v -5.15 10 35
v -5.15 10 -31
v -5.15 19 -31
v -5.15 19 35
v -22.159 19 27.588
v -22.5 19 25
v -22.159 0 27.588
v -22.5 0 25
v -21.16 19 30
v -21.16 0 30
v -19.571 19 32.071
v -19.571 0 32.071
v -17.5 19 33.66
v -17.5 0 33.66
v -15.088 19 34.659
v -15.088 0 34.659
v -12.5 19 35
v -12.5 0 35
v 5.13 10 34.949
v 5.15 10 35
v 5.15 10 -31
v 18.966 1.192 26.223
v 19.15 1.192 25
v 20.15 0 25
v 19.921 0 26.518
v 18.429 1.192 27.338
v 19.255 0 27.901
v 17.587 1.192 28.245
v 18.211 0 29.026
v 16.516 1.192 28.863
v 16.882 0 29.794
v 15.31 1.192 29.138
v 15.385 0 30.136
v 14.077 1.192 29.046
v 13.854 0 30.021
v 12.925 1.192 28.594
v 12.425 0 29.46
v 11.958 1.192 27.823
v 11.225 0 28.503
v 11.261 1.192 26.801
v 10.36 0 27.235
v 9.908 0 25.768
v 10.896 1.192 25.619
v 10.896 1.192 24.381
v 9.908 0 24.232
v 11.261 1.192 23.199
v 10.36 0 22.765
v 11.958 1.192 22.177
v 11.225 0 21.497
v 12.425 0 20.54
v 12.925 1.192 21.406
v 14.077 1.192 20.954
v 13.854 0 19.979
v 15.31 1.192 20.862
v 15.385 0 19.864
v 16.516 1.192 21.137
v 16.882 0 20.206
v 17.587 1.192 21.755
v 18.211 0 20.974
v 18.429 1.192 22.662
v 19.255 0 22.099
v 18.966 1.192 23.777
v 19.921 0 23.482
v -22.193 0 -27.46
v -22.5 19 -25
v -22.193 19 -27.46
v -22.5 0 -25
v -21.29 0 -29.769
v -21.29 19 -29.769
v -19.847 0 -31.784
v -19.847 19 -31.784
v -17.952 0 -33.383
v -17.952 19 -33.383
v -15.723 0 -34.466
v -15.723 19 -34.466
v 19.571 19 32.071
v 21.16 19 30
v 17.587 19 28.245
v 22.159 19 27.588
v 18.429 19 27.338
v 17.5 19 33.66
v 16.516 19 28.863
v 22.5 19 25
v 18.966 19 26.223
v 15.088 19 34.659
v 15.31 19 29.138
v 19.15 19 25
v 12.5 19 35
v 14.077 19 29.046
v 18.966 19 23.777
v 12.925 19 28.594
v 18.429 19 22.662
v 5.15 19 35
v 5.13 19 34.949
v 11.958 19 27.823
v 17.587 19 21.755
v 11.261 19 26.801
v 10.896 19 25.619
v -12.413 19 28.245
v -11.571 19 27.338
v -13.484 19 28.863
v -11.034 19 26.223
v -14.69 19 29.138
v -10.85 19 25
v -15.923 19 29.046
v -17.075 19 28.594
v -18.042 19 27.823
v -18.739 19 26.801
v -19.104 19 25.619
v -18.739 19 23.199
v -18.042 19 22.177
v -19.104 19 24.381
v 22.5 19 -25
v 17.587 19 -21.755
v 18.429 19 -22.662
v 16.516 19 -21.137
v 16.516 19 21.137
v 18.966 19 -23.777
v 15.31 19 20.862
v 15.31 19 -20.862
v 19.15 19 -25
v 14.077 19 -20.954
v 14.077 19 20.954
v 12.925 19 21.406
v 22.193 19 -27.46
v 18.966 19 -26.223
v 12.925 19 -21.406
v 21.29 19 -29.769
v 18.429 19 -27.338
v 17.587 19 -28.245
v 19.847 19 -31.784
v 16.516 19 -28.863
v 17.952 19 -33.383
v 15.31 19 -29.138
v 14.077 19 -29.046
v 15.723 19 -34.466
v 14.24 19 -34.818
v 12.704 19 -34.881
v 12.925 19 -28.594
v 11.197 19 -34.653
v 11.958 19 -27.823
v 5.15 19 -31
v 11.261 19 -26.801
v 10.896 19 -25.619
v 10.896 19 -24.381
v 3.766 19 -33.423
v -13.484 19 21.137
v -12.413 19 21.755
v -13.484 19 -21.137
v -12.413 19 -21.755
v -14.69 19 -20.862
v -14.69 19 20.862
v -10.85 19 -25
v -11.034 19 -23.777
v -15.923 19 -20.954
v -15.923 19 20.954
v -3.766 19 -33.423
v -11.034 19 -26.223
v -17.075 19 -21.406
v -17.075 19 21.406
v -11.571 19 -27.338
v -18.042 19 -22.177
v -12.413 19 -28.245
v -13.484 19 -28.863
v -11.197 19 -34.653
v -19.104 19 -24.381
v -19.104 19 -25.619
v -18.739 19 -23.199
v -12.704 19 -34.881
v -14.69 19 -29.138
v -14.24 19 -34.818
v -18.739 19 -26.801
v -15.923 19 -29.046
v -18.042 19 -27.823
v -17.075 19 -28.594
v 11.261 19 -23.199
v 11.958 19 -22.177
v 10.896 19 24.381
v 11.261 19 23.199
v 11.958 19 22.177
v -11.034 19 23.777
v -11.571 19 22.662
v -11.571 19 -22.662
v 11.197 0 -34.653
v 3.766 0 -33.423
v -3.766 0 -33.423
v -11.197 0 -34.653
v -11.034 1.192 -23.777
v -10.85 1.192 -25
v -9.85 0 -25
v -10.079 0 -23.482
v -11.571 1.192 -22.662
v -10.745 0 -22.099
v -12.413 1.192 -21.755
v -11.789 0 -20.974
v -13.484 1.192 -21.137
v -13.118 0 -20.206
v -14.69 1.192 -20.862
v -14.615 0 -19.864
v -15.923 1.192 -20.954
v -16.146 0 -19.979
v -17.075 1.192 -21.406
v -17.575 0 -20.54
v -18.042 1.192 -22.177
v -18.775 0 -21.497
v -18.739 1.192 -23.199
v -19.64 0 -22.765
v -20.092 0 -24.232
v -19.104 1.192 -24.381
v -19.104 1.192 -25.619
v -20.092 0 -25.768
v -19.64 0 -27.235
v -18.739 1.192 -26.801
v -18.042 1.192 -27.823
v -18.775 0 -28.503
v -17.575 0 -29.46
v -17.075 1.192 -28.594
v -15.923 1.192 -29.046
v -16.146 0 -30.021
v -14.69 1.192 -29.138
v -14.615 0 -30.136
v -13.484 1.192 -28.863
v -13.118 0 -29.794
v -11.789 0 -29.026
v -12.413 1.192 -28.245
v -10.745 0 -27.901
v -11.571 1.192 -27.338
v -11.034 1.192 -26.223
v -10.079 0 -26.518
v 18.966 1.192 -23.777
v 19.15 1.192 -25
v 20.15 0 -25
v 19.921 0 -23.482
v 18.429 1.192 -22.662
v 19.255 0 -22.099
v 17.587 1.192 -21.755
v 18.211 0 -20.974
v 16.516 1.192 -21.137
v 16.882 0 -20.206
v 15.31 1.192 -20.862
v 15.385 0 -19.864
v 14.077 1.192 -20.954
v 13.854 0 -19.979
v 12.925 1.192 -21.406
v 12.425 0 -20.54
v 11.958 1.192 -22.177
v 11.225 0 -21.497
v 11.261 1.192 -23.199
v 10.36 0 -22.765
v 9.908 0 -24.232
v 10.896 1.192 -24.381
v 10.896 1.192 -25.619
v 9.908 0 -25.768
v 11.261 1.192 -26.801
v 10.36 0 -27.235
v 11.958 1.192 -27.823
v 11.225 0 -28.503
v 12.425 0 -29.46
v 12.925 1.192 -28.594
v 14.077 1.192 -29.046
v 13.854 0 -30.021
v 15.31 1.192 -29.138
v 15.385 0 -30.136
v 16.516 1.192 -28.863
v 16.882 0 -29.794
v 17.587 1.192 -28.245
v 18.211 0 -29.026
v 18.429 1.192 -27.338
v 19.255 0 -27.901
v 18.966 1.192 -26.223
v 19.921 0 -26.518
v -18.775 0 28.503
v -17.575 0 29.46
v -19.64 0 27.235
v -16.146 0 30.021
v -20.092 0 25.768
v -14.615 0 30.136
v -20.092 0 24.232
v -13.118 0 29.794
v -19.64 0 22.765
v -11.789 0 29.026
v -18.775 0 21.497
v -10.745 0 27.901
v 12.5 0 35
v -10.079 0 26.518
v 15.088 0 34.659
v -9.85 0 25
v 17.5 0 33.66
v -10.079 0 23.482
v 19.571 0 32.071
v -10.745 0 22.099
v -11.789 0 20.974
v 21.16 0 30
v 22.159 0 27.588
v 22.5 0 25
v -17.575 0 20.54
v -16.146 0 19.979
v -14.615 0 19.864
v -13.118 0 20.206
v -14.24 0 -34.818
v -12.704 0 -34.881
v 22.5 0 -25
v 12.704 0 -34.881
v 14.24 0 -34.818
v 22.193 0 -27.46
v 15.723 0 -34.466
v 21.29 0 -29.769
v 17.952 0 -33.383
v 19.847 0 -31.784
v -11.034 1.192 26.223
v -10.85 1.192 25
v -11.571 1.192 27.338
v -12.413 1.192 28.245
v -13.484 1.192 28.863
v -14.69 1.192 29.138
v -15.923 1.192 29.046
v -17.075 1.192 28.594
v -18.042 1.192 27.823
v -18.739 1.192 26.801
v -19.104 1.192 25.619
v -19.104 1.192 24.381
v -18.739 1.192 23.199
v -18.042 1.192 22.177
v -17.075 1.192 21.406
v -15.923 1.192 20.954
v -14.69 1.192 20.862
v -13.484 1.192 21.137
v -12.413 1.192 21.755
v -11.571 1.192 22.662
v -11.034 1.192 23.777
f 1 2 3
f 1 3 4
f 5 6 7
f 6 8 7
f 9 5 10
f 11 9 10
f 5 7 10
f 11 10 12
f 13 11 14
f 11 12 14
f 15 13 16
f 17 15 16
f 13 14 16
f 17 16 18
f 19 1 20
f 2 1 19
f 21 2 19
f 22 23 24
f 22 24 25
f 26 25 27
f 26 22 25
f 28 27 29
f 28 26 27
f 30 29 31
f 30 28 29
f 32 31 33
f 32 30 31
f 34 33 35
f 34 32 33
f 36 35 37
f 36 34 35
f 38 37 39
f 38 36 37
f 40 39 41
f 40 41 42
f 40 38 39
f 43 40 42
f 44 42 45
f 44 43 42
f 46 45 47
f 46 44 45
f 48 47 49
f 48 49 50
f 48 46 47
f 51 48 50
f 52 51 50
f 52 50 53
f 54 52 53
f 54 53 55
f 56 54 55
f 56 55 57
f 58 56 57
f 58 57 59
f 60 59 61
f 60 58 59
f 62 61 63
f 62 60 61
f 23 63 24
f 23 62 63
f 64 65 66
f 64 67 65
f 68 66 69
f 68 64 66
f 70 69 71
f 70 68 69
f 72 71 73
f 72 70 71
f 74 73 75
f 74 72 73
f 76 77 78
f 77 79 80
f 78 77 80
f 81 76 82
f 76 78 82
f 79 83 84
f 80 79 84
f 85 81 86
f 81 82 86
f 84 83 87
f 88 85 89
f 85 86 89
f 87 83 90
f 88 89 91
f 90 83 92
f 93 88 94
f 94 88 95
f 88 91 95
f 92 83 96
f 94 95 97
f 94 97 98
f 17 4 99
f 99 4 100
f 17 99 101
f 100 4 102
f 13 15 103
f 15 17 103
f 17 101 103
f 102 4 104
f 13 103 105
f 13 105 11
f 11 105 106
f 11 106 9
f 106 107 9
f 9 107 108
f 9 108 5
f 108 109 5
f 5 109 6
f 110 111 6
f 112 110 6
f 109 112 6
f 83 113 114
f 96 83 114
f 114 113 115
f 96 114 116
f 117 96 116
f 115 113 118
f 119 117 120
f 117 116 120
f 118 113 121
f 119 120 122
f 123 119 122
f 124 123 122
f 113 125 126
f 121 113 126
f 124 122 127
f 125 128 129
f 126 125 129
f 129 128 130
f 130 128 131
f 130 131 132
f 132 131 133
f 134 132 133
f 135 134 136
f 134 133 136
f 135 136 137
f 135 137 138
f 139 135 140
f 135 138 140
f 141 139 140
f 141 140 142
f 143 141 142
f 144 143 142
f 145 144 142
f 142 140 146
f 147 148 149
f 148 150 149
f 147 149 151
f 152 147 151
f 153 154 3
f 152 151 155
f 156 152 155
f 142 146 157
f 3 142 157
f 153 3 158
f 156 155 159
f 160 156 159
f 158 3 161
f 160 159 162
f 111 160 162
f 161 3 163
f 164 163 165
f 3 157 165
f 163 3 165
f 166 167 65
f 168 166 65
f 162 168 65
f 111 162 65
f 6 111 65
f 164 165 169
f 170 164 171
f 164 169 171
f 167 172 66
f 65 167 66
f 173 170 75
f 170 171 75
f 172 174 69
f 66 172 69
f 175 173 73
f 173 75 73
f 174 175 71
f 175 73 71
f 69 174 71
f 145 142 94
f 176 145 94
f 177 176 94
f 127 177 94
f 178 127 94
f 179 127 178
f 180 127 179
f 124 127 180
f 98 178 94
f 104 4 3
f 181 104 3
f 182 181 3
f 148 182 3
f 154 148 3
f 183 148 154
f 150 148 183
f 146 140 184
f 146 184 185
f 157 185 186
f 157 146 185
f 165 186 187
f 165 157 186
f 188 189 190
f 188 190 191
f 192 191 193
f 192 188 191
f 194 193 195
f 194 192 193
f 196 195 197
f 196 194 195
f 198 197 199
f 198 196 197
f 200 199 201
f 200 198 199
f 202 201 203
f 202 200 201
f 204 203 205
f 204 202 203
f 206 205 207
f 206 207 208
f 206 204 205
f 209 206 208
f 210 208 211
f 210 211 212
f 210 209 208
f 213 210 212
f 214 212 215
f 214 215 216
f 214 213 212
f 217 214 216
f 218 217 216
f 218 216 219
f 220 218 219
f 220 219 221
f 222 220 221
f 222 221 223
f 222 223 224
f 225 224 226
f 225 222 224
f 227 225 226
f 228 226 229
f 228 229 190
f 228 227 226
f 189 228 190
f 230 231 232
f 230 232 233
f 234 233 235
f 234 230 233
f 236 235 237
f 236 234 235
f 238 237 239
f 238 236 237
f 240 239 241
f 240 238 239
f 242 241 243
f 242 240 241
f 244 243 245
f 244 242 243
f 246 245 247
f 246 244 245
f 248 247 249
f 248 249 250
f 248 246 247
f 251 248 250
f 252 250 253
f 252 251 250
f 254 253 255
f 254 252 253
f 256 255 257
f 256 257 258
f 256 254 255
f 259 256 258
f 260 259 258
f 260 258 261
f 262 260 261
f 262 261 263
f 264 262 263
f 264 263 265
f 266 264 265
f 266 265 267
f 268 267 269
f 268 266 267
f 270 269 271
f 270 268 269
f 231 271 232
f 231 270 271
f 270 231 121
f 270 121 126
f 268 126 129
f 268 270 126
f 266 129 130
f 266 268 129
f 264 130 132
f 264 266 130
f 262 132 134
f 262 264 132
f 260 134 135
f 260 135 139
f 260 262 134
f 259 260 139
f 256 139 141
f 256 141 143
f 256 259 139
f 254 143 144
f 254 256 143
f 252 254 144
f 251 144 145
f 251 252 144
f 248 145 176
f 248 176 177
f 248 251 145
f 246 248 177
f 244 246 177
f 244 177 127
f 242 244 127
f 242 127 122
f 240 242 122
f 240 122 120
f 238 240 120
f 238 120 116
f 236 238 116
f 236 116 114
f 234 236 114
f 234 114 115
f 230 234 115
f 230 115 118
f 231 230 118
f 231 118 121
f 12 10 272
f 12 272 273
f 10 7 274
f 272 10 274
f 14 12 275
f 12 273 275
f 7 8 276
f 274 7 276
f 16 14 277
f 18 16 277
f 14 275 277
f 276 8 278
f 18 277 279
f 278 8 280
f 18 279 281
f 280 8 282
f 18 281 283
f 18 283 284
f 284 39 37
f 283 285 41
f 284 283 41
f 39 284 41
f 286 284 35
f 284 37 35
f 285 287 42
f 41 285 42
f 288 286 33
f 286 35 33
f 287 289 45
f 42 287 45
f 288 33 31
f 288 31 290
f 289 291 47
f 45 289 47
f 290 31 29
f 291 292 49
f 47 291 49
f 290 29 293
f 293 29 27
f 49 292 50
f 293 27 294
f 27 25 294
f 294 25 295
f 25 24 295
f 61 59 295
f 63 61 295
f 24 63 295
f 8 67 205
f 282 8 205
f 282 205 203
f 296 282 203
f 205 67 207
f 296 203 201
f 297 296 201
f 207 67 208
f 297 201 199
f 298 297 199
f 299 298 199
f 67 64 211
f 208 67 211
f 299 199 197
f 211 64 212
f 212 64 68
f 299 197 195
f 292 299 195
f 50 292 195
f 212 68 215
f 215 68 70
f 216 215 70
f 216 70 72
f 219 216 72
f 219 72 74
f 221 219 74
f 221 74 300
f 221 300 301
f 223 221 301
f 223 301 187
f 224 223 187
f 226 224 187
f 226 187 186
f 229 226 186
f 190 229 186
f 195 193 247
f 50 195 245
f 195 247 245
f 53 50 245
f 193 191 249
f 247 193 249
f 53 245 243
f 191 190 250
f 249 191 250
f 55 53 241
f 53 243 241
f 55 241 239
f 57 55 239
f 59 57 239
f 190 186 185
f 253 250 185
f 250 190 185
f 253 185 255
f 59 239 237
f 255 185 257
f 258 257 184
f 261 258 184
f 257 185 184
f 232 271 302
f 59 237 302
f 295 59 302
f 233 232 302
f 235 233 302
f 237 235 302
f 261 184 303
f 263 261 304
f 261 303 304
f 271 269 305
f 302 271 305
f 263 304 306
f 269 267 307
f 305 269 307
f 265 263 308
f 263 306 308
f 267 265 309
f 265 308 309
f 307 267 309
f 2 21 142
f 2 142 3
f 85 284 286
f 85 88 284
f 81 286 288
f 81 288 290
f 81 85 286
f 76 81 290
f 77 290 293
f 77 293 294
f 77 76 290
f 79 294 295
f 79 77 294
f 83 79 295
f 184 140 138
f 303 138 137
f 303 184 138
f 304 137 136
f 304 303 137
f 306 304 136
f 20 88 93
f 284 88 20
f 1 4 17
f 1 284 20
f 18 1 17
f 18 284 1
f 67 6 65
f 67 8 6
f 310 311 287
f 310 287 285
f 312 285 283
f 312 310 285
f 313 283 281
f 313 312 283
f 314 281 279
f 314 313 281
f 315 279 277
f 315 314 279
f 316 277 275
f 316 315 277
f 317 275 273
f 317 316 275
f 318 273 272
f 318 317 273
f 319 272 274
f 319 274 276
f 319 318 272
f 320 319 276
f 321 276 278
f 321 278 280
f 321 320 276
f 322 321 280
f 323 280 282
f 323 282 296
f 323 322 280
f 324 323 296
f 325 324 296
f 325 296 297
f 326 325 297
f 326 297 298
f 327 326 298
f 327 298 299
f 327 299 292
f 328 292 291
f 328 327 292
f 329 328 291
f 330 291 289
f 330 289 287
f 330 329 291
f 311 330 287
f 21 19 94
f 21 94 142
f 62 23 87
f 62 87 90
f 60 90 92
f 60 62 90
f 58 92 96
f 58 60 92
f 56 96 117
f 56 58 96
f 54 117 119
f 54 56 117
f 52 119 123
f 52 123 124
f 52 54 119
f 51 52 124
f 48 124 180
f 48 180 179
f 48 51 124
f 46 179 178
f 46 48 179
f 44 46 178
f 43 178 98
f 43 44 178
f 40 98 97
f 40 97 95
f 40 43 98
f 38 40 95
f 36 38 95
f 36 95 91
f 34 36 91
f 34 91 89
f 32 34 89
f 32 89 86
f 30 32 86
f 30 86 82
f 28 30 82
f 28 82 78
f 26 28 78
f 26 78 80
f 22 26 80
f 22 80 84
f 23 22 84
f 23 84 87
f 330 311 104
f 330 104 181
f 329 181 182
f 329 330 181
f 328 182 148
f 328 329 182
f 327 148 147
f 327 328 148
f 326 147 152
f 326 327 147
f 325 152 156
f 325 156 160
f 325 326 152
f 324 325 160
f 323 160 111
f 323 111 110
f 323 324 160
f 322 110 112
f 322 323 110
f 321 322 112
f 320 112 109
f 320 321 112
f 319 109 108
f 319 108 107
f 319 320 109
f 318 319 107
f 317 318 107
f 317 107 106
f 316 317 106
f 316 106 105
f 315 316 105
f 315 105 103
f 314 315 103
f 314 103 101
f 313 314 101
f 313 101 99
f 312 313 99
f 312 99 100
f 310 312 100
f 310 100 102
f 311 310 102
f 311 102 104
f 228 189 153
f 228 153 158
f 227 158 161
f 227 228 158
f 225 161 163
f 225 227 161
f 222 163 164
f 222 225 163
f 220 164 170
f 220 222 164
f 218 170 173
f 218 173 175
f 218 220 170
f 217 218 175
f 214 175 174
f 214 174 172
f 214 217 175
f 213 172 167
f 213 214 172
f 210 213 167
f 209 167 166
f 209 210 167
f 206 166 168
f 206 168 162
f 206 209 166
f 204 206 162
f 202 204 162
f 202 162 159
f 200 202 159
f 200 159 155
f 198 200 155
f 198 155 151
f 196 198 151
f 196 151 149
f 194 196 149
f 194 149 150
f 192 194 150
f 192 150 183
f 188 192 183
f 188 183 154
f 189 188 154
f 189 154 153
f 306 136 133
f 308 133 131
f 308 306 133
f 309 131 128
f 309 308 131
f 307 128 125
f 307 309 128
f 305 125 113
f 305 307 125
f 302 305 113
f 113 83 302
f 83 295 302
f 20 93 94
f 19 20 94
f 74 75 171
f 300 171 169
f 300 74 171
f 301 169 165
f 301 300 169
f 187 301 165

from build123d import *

# Parameters (mm, degrees)
SKETCH1_W           = 45
SKETCH1_H           = 70
BOSS_EXTRUDE1_DEPTH = 10
SKETCH3_R           = 4.15
CUT_EXTRUDE2_DEPTH  = 11
SKETCH5_R           = 4.15
BOSS_EXTRUDE2_DEPTH = 9
CHAMFER1_SIZE       = 1
CHAMFER1_SIZE2      = 1.191753593
FILLET1_R           = 10
CUT_EXTRUDE3_DEPTH  = 20
FILLET2_R           = 8


with BuildPart() as part:
    # Sketch1 → Boss-Extrude1 (new body)
    with BuildSketch(Plane(origin=(0, 0, 0), x_dir=(1, 0, 0), z_dir=(0, 1, 0))):
        Rectangle(SKETCH1_W, SKETCH1_H)
    extrude(amount=BOSS_EXTRUDE1_DEPTH)

    # Sketch3 → Cut-Extrude2 (cut, through all)
    with BuildSketch(Plane.XZ):
        with Locations((15, 25)):
            Circle(SKETCH3_R)
        with Locations((15, -25)):
            Circle(SKETCH3_R)
        with Locations((-15, -25)):
            Circle(SKETCH3_R)
        with Locations((-15, 25)):
            Circle(SKETCH3_R)
    extrude(amount=-CUT_EXTRUDE2_DEPTH, mode=Mode.SUBTRACT)

    # Sketch5 → Boss-Extrude2 (add)
    with BuildSketch(Plane(origin=(0, 10, 0), x_dir=(1, 0, 0), z_dir=(0, 1, 0))):
        Polygon((-5.15, -35), (-22.5, -35), (-22.5, 35), (22.5, 35), (22.5, -35), (5.15, -35), (5.130229348, -34.949305848), (5.15, 31), (-5.15, 31), align=None)
        with Locations((-15, 25)):
            Circle(SKETCH5_R, mode=Mode.SUBTRACT)
        with Locations((15, 25)):
            Circle(SKETCH5_R, mode=Mode.SUBTRACT)
        with Locations((15, -25)):
            Circle(SKETCH5_R, mode=Mode.SUBTRACT)
        with Locations((-15, -25)):
            Circle(SKETCH5_R, mode=Mode.SUBTRACT)
    extrude(amount=BOSS_EXTRUDE2_DEPTH)

    # Chamfer1
    chamfer1_edges = [part.edges().sort_by_distance(p)[0] for p in [
        (-19.15, 0, -25),
        (-19.15, 0, 25),
        (10.85, 0, 25),
        (10.85, 0, -25),
    ]]
    chamfer1_side = [part.faces().sort_by_distance(p)[0] for p in [
        (0, 0, 0),
    ]]
    chamfer(chamfer1_edges, length=CHAMFER1_SIZE, length2=CHAMFER1_SIZE2, reference=chamfer1_side[0])

    # Fillet1
    fillet1_edges = [part.edges().sort_by_distance(p)[0] for p in [
        (-22.5, 9.5, -35),
        (22.5, 9.5, -35),
        (22.5, 9.5, 35),
        (-22.5, 9.5, 35),
    ]]
    fillet(fillet1_edges, radius=FILLET1_R)

    # Sketch6 → Cut-Extrude3 (cut, through all)
    with BuildSketch(Plane(origin=(0, 19, 0), x_dir=(1, 0, 0), z_dir=(0, 1, 0))):
        with BuildLine():
            Line((-12.5, 35), (12.5, 35))
            ThreePointArc((12.5, 35), (0, 33.26906369), (-12.5, 35))
        make_face()
    extrude(amount=-CUT_EXTRUDE3_DEPTH, mode=Mode.SUBTRACT)

    # Fillet2
    fillet2_edges = [part.edges().sort_by_distance(p)[0] for p in [
        (-12.5, 9.5, -35),
        (12.5, 9.5, -35),
    ]]
    fillet(fillet2_edges, radius=FILLET2_R)


solid = part.part
